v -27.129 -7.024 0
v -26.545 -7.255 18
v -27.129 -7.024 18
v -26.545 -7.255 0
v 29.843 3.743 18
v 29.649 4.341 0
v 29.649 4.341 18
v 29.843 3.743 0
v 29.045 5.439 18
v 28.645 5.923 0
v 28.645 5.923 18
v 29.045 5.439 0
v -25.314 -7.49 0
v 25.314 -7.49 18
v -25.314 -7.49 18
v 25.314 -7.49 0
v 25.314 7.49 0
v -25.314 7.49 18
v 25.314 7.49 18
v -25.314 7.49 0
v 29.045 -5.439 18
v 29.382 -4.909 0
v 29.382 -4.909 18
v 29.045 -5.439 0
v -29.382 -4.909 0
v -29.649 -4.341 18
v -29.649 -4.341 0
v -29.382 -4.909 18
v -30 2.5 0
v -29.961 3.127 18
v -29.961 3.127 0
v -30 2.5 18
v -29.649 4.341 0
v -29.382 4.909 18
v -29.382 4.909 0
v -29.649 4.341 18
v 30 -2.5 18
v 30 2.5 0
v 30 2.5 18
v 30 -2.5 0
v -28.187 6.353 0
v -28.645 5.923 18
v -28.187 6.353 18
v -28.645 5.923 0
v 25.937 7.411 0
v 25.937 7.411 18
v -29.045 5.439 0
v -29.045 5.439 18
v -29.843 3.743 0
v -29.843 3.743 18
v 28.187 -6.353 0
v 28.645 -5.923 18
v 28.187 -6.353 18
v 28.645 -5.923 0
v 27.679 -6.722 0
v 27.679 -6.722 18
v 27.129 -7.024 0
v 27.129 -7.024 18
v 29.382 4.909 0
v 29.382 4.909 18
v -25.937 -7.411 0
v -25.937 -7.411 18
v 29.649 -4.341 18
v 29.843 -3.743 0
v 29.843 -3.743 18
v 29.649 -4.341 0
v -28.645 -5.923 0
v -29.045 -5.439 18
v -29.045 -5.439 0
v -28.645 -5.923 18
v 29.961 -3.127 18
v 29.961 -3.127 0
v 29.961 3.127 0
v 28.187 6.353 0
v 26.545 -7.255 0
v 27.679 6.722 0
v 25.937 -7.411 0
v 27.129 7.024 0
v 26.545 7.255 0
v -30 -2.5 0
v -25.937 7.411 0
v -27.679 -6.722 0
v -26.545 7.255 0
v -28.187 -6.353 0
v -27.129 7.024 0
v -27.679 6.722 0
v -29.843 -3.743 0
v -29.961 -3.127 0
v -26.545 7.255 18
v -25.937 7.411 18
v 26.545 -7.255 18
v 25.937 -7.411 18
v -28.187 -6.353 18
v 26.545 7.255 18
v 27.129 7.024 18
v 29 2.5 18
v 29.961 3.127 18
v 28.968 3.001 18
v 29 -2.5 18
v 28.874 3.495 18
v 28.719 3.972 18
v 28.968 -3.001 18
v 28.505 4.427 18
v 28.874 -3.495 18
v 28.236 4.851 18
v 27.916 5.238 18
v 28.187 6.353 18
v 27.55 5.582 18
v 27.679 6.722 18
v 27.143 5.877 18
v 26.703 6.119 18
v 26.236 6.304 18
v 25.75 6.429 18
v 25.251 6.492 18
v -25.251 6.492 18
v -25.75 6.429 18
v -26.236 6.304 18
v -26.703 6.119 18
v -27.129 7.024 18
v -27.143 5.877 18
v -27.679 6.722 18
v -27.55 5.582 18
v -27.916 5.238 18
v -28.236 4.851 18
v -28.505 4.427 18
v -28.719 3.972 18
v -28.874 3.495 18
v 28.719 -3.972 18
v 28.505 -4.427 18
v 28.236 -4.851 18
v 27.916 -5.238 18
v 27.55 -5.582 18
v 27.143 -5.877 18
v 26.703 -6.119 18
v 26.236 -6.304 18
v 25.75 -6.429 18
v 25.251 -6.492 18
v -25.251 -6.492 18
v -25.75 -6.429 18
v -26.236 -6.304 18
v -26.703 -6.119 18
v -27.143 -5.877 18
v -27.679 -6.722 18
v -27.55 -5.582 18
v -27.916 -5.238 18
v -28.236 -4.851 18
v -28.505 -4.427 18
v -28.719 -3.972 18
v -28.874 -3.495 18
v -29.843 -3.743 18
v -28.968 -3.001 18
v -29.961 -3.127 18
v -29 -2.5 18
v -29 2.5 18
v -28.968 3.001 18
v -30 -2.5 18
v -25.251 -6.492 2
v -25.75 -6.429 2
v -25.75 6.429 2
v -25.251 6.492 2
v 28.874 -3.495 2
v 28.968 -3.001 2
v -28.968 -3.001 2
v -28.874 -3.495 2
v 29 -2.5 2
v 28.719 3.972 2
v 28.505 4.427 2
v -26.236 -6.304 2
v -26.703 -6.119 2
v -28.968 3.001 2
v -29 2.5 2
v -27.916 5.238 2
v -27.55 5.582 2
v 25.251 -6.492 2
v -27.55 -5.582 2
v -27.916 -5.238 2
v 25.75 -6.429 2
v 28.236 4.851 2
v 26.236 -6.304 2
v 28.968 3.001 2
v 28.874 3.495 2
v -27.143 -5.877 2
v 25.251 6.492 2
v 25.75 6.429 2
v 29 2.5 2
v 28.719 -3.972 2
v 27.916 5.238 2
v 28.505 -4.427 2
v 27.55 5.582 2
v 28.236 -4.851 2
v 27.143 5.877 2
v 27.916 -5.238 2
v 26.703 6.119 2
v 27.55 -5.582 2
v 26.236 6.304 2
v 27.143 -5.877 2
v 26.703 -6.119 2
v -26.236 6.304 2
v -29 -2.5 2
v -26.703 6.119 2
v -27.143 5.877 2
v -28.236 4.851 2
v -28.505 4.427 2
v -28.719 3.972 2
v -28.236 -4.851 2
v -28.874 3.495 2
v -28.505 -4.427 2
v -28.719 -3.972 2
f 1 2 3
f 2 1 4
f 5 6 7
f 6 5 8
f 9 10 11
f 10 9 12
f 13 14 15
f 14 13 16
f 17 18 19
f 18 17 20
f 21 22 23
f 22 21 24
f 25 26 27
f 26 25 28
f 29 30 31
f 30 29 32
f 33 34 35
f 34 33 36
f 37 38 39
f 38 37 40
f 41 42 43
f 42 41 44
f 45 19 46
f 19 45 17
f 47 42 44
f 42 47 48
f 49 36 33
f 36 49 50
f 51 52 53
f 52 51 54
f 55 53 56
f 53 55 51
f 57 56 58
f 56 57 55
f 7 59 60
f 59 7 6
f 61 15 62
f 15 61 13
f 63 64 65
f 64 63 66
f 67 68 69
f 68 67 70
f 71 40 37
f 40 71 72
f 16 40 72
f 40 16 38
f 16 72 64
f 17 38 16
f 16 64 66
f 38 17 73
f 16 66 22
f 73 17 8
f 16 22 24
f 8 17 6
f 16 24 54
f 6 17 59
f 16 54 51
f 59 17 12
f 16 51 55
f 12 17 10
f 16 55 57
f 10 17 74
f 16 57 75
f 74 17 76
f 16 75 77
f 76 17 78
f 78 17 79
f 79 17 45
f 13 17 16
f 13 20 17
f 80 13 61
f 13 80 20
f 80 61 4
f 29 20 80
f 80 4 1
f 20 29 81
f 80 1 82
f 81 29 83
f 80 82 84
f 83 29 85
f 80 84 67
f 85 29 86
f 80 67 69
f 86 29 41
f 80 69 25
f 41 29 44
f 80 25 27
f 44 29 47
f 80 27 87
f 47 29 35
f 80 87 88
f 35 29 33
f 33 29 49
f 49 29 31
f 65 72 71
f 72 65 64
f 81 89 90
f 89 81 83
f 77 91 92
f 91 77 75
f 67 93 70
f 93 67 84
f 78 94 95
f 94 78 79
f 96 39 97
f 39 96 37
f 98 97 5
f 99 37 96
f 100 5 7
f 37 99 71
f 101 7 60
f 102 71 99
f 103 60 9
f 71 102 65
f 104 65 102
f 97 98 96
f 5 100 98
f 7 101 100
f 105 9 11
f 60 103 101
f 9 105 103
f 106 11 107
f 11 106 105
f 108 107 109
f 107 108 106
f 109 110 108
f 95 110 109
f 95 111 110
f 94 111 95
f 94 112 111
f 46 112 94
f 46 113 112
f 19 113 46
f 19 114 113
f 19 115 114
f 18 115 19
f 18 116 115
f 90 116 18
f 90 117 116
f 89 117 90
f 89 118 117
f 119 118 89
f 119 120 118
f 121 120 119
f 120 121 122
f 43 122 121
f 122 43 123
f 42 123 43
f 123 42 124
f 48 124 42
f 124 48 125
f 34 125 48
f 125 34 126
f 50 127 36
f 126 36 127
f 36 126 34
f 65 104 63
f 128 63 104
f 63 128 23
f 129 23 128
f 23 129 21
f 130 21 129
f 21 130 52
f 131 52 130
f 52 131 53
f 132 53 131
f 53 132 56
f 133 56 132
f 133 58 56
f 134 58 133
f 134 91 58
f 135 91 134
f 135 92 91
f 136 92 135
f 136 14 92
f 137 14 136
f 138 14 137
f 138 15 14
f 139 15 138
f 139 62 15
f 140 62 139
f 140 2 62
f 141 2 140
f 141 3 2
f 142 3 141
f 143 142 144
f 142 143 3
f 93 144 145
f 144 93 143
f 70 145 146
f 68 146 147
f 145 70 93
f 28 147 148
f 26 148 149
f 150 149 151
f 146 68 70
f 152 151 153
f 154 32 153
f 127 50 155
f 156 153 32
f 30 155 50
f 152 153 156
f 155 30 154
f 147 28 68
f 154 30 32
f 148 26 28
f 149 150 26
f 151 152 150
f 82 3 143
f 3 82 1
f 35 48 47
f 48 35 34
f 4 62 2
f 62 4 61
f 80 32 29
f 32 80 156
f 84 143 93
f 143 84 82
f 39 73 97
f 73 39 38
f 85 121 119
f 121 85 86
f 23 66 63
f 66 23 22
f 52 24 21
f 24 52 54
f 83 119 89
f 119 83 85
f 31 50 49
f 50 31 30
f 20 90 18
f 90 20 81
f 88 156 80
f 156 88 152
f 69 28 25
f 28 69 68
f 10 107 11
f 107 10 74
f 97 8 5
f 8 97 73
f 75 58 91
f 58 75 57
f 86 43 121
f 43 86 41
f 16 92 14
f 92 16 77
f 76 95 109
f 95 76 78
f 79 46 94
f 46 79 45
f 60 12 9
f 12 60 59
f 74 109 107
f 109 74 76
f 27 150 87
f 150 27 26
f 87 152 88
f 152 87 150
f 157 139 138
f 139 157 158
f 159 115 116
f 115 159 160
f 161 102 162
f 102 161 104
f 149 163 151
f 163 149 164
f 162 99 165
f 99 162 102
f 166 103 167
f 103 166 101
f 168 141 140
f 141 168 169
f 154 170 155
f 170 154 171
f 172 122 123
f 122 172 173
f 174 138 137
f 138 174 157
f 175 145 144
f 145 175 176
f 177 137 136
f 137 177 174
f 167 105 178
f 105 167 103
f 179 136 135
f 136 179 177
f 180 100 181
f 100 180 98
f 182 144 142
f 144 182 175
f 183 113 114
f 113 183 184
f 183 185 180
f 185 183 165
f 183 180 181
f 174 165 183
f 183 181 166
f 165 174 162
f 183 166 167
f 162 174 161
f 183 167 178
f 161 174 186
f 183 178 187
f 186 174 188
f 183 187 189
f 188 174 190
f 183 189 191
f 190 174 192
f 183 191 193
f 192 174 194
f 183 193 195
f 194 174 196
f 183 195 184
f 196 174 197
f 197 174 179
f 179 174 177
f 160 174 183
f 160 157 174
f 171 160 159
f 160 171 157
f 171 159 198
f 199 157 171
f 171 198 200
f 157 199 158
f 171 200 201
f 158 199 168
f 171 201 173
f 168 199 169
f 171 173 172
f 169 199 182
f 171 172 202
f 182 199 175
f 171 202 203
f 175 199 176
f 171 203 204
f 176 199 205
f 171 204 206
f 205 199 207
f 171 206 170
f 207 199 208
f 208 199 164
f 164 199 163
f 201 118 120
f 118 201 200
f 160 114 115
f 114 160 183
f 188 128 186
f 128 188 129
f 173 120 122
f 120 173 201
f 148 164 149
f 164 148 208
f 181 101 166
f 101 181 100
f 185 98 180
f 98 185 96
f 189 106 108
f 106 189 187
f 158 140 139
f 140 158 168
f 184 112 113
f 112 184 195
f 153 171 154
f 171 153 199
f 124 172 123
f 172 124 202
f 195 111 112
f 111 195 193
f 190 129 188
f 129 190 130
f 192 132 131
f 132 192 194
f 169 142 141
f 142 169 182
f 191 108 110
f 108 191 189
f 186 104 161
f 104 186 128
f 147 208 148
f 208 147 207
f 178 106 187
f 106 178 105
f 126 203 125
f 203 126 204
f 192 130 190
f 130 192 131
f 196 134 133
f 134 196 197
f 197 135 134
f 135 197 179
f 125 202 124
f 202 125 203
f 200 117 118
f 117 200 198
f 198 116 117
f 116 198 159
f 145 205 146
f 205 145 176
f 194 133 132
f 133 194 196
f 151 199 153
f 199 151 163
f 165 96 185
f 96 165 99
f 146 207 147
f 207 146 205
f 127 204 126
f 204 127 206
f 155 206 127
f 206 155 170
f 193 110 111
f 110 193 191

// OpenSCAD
$fn = 50;


difference() {
	union() {
		hull() {
			translate(v = [-25.0000000000, 2.5000000000, 0]) {
				cylinder(h = 18, r = 5);
			}
			translate(v = [25.0000000000, 2.5000000000, 0]) {
				cylinder(h = 18, r = 5);
			}
			translate(v = [-25.0000000000, -2.5000000000, 0]) {
				cylinder(h = 18, r = 5);
			}
			translate(v = [25.0000000000, -2.5000000000, 0]) {
				cylinder(h = 18, r = 5);
			}
		}
	}
	union() {
		translate(v = [0, 0, 2]) {
			#hull() {
				translate(v = [-25.0000000000, 2.5000000000, 0]) {
					cylinder(h = 16, r = 4);
				}
				translate(v = [25.0000000000, 2.5000000000, 0]) {
					cylinder(h = 16, r = 4);
				}
				translate(v = [-25.0000000000, -2.5000000000, 0]) {
					cylinder(h = 16, r = 4);
				}
				translate(v = [25.0000000000, -2.5000000000, 0]) {
					cylinder(h = 16, r = 4);
				}
			}
		}
	}
}
